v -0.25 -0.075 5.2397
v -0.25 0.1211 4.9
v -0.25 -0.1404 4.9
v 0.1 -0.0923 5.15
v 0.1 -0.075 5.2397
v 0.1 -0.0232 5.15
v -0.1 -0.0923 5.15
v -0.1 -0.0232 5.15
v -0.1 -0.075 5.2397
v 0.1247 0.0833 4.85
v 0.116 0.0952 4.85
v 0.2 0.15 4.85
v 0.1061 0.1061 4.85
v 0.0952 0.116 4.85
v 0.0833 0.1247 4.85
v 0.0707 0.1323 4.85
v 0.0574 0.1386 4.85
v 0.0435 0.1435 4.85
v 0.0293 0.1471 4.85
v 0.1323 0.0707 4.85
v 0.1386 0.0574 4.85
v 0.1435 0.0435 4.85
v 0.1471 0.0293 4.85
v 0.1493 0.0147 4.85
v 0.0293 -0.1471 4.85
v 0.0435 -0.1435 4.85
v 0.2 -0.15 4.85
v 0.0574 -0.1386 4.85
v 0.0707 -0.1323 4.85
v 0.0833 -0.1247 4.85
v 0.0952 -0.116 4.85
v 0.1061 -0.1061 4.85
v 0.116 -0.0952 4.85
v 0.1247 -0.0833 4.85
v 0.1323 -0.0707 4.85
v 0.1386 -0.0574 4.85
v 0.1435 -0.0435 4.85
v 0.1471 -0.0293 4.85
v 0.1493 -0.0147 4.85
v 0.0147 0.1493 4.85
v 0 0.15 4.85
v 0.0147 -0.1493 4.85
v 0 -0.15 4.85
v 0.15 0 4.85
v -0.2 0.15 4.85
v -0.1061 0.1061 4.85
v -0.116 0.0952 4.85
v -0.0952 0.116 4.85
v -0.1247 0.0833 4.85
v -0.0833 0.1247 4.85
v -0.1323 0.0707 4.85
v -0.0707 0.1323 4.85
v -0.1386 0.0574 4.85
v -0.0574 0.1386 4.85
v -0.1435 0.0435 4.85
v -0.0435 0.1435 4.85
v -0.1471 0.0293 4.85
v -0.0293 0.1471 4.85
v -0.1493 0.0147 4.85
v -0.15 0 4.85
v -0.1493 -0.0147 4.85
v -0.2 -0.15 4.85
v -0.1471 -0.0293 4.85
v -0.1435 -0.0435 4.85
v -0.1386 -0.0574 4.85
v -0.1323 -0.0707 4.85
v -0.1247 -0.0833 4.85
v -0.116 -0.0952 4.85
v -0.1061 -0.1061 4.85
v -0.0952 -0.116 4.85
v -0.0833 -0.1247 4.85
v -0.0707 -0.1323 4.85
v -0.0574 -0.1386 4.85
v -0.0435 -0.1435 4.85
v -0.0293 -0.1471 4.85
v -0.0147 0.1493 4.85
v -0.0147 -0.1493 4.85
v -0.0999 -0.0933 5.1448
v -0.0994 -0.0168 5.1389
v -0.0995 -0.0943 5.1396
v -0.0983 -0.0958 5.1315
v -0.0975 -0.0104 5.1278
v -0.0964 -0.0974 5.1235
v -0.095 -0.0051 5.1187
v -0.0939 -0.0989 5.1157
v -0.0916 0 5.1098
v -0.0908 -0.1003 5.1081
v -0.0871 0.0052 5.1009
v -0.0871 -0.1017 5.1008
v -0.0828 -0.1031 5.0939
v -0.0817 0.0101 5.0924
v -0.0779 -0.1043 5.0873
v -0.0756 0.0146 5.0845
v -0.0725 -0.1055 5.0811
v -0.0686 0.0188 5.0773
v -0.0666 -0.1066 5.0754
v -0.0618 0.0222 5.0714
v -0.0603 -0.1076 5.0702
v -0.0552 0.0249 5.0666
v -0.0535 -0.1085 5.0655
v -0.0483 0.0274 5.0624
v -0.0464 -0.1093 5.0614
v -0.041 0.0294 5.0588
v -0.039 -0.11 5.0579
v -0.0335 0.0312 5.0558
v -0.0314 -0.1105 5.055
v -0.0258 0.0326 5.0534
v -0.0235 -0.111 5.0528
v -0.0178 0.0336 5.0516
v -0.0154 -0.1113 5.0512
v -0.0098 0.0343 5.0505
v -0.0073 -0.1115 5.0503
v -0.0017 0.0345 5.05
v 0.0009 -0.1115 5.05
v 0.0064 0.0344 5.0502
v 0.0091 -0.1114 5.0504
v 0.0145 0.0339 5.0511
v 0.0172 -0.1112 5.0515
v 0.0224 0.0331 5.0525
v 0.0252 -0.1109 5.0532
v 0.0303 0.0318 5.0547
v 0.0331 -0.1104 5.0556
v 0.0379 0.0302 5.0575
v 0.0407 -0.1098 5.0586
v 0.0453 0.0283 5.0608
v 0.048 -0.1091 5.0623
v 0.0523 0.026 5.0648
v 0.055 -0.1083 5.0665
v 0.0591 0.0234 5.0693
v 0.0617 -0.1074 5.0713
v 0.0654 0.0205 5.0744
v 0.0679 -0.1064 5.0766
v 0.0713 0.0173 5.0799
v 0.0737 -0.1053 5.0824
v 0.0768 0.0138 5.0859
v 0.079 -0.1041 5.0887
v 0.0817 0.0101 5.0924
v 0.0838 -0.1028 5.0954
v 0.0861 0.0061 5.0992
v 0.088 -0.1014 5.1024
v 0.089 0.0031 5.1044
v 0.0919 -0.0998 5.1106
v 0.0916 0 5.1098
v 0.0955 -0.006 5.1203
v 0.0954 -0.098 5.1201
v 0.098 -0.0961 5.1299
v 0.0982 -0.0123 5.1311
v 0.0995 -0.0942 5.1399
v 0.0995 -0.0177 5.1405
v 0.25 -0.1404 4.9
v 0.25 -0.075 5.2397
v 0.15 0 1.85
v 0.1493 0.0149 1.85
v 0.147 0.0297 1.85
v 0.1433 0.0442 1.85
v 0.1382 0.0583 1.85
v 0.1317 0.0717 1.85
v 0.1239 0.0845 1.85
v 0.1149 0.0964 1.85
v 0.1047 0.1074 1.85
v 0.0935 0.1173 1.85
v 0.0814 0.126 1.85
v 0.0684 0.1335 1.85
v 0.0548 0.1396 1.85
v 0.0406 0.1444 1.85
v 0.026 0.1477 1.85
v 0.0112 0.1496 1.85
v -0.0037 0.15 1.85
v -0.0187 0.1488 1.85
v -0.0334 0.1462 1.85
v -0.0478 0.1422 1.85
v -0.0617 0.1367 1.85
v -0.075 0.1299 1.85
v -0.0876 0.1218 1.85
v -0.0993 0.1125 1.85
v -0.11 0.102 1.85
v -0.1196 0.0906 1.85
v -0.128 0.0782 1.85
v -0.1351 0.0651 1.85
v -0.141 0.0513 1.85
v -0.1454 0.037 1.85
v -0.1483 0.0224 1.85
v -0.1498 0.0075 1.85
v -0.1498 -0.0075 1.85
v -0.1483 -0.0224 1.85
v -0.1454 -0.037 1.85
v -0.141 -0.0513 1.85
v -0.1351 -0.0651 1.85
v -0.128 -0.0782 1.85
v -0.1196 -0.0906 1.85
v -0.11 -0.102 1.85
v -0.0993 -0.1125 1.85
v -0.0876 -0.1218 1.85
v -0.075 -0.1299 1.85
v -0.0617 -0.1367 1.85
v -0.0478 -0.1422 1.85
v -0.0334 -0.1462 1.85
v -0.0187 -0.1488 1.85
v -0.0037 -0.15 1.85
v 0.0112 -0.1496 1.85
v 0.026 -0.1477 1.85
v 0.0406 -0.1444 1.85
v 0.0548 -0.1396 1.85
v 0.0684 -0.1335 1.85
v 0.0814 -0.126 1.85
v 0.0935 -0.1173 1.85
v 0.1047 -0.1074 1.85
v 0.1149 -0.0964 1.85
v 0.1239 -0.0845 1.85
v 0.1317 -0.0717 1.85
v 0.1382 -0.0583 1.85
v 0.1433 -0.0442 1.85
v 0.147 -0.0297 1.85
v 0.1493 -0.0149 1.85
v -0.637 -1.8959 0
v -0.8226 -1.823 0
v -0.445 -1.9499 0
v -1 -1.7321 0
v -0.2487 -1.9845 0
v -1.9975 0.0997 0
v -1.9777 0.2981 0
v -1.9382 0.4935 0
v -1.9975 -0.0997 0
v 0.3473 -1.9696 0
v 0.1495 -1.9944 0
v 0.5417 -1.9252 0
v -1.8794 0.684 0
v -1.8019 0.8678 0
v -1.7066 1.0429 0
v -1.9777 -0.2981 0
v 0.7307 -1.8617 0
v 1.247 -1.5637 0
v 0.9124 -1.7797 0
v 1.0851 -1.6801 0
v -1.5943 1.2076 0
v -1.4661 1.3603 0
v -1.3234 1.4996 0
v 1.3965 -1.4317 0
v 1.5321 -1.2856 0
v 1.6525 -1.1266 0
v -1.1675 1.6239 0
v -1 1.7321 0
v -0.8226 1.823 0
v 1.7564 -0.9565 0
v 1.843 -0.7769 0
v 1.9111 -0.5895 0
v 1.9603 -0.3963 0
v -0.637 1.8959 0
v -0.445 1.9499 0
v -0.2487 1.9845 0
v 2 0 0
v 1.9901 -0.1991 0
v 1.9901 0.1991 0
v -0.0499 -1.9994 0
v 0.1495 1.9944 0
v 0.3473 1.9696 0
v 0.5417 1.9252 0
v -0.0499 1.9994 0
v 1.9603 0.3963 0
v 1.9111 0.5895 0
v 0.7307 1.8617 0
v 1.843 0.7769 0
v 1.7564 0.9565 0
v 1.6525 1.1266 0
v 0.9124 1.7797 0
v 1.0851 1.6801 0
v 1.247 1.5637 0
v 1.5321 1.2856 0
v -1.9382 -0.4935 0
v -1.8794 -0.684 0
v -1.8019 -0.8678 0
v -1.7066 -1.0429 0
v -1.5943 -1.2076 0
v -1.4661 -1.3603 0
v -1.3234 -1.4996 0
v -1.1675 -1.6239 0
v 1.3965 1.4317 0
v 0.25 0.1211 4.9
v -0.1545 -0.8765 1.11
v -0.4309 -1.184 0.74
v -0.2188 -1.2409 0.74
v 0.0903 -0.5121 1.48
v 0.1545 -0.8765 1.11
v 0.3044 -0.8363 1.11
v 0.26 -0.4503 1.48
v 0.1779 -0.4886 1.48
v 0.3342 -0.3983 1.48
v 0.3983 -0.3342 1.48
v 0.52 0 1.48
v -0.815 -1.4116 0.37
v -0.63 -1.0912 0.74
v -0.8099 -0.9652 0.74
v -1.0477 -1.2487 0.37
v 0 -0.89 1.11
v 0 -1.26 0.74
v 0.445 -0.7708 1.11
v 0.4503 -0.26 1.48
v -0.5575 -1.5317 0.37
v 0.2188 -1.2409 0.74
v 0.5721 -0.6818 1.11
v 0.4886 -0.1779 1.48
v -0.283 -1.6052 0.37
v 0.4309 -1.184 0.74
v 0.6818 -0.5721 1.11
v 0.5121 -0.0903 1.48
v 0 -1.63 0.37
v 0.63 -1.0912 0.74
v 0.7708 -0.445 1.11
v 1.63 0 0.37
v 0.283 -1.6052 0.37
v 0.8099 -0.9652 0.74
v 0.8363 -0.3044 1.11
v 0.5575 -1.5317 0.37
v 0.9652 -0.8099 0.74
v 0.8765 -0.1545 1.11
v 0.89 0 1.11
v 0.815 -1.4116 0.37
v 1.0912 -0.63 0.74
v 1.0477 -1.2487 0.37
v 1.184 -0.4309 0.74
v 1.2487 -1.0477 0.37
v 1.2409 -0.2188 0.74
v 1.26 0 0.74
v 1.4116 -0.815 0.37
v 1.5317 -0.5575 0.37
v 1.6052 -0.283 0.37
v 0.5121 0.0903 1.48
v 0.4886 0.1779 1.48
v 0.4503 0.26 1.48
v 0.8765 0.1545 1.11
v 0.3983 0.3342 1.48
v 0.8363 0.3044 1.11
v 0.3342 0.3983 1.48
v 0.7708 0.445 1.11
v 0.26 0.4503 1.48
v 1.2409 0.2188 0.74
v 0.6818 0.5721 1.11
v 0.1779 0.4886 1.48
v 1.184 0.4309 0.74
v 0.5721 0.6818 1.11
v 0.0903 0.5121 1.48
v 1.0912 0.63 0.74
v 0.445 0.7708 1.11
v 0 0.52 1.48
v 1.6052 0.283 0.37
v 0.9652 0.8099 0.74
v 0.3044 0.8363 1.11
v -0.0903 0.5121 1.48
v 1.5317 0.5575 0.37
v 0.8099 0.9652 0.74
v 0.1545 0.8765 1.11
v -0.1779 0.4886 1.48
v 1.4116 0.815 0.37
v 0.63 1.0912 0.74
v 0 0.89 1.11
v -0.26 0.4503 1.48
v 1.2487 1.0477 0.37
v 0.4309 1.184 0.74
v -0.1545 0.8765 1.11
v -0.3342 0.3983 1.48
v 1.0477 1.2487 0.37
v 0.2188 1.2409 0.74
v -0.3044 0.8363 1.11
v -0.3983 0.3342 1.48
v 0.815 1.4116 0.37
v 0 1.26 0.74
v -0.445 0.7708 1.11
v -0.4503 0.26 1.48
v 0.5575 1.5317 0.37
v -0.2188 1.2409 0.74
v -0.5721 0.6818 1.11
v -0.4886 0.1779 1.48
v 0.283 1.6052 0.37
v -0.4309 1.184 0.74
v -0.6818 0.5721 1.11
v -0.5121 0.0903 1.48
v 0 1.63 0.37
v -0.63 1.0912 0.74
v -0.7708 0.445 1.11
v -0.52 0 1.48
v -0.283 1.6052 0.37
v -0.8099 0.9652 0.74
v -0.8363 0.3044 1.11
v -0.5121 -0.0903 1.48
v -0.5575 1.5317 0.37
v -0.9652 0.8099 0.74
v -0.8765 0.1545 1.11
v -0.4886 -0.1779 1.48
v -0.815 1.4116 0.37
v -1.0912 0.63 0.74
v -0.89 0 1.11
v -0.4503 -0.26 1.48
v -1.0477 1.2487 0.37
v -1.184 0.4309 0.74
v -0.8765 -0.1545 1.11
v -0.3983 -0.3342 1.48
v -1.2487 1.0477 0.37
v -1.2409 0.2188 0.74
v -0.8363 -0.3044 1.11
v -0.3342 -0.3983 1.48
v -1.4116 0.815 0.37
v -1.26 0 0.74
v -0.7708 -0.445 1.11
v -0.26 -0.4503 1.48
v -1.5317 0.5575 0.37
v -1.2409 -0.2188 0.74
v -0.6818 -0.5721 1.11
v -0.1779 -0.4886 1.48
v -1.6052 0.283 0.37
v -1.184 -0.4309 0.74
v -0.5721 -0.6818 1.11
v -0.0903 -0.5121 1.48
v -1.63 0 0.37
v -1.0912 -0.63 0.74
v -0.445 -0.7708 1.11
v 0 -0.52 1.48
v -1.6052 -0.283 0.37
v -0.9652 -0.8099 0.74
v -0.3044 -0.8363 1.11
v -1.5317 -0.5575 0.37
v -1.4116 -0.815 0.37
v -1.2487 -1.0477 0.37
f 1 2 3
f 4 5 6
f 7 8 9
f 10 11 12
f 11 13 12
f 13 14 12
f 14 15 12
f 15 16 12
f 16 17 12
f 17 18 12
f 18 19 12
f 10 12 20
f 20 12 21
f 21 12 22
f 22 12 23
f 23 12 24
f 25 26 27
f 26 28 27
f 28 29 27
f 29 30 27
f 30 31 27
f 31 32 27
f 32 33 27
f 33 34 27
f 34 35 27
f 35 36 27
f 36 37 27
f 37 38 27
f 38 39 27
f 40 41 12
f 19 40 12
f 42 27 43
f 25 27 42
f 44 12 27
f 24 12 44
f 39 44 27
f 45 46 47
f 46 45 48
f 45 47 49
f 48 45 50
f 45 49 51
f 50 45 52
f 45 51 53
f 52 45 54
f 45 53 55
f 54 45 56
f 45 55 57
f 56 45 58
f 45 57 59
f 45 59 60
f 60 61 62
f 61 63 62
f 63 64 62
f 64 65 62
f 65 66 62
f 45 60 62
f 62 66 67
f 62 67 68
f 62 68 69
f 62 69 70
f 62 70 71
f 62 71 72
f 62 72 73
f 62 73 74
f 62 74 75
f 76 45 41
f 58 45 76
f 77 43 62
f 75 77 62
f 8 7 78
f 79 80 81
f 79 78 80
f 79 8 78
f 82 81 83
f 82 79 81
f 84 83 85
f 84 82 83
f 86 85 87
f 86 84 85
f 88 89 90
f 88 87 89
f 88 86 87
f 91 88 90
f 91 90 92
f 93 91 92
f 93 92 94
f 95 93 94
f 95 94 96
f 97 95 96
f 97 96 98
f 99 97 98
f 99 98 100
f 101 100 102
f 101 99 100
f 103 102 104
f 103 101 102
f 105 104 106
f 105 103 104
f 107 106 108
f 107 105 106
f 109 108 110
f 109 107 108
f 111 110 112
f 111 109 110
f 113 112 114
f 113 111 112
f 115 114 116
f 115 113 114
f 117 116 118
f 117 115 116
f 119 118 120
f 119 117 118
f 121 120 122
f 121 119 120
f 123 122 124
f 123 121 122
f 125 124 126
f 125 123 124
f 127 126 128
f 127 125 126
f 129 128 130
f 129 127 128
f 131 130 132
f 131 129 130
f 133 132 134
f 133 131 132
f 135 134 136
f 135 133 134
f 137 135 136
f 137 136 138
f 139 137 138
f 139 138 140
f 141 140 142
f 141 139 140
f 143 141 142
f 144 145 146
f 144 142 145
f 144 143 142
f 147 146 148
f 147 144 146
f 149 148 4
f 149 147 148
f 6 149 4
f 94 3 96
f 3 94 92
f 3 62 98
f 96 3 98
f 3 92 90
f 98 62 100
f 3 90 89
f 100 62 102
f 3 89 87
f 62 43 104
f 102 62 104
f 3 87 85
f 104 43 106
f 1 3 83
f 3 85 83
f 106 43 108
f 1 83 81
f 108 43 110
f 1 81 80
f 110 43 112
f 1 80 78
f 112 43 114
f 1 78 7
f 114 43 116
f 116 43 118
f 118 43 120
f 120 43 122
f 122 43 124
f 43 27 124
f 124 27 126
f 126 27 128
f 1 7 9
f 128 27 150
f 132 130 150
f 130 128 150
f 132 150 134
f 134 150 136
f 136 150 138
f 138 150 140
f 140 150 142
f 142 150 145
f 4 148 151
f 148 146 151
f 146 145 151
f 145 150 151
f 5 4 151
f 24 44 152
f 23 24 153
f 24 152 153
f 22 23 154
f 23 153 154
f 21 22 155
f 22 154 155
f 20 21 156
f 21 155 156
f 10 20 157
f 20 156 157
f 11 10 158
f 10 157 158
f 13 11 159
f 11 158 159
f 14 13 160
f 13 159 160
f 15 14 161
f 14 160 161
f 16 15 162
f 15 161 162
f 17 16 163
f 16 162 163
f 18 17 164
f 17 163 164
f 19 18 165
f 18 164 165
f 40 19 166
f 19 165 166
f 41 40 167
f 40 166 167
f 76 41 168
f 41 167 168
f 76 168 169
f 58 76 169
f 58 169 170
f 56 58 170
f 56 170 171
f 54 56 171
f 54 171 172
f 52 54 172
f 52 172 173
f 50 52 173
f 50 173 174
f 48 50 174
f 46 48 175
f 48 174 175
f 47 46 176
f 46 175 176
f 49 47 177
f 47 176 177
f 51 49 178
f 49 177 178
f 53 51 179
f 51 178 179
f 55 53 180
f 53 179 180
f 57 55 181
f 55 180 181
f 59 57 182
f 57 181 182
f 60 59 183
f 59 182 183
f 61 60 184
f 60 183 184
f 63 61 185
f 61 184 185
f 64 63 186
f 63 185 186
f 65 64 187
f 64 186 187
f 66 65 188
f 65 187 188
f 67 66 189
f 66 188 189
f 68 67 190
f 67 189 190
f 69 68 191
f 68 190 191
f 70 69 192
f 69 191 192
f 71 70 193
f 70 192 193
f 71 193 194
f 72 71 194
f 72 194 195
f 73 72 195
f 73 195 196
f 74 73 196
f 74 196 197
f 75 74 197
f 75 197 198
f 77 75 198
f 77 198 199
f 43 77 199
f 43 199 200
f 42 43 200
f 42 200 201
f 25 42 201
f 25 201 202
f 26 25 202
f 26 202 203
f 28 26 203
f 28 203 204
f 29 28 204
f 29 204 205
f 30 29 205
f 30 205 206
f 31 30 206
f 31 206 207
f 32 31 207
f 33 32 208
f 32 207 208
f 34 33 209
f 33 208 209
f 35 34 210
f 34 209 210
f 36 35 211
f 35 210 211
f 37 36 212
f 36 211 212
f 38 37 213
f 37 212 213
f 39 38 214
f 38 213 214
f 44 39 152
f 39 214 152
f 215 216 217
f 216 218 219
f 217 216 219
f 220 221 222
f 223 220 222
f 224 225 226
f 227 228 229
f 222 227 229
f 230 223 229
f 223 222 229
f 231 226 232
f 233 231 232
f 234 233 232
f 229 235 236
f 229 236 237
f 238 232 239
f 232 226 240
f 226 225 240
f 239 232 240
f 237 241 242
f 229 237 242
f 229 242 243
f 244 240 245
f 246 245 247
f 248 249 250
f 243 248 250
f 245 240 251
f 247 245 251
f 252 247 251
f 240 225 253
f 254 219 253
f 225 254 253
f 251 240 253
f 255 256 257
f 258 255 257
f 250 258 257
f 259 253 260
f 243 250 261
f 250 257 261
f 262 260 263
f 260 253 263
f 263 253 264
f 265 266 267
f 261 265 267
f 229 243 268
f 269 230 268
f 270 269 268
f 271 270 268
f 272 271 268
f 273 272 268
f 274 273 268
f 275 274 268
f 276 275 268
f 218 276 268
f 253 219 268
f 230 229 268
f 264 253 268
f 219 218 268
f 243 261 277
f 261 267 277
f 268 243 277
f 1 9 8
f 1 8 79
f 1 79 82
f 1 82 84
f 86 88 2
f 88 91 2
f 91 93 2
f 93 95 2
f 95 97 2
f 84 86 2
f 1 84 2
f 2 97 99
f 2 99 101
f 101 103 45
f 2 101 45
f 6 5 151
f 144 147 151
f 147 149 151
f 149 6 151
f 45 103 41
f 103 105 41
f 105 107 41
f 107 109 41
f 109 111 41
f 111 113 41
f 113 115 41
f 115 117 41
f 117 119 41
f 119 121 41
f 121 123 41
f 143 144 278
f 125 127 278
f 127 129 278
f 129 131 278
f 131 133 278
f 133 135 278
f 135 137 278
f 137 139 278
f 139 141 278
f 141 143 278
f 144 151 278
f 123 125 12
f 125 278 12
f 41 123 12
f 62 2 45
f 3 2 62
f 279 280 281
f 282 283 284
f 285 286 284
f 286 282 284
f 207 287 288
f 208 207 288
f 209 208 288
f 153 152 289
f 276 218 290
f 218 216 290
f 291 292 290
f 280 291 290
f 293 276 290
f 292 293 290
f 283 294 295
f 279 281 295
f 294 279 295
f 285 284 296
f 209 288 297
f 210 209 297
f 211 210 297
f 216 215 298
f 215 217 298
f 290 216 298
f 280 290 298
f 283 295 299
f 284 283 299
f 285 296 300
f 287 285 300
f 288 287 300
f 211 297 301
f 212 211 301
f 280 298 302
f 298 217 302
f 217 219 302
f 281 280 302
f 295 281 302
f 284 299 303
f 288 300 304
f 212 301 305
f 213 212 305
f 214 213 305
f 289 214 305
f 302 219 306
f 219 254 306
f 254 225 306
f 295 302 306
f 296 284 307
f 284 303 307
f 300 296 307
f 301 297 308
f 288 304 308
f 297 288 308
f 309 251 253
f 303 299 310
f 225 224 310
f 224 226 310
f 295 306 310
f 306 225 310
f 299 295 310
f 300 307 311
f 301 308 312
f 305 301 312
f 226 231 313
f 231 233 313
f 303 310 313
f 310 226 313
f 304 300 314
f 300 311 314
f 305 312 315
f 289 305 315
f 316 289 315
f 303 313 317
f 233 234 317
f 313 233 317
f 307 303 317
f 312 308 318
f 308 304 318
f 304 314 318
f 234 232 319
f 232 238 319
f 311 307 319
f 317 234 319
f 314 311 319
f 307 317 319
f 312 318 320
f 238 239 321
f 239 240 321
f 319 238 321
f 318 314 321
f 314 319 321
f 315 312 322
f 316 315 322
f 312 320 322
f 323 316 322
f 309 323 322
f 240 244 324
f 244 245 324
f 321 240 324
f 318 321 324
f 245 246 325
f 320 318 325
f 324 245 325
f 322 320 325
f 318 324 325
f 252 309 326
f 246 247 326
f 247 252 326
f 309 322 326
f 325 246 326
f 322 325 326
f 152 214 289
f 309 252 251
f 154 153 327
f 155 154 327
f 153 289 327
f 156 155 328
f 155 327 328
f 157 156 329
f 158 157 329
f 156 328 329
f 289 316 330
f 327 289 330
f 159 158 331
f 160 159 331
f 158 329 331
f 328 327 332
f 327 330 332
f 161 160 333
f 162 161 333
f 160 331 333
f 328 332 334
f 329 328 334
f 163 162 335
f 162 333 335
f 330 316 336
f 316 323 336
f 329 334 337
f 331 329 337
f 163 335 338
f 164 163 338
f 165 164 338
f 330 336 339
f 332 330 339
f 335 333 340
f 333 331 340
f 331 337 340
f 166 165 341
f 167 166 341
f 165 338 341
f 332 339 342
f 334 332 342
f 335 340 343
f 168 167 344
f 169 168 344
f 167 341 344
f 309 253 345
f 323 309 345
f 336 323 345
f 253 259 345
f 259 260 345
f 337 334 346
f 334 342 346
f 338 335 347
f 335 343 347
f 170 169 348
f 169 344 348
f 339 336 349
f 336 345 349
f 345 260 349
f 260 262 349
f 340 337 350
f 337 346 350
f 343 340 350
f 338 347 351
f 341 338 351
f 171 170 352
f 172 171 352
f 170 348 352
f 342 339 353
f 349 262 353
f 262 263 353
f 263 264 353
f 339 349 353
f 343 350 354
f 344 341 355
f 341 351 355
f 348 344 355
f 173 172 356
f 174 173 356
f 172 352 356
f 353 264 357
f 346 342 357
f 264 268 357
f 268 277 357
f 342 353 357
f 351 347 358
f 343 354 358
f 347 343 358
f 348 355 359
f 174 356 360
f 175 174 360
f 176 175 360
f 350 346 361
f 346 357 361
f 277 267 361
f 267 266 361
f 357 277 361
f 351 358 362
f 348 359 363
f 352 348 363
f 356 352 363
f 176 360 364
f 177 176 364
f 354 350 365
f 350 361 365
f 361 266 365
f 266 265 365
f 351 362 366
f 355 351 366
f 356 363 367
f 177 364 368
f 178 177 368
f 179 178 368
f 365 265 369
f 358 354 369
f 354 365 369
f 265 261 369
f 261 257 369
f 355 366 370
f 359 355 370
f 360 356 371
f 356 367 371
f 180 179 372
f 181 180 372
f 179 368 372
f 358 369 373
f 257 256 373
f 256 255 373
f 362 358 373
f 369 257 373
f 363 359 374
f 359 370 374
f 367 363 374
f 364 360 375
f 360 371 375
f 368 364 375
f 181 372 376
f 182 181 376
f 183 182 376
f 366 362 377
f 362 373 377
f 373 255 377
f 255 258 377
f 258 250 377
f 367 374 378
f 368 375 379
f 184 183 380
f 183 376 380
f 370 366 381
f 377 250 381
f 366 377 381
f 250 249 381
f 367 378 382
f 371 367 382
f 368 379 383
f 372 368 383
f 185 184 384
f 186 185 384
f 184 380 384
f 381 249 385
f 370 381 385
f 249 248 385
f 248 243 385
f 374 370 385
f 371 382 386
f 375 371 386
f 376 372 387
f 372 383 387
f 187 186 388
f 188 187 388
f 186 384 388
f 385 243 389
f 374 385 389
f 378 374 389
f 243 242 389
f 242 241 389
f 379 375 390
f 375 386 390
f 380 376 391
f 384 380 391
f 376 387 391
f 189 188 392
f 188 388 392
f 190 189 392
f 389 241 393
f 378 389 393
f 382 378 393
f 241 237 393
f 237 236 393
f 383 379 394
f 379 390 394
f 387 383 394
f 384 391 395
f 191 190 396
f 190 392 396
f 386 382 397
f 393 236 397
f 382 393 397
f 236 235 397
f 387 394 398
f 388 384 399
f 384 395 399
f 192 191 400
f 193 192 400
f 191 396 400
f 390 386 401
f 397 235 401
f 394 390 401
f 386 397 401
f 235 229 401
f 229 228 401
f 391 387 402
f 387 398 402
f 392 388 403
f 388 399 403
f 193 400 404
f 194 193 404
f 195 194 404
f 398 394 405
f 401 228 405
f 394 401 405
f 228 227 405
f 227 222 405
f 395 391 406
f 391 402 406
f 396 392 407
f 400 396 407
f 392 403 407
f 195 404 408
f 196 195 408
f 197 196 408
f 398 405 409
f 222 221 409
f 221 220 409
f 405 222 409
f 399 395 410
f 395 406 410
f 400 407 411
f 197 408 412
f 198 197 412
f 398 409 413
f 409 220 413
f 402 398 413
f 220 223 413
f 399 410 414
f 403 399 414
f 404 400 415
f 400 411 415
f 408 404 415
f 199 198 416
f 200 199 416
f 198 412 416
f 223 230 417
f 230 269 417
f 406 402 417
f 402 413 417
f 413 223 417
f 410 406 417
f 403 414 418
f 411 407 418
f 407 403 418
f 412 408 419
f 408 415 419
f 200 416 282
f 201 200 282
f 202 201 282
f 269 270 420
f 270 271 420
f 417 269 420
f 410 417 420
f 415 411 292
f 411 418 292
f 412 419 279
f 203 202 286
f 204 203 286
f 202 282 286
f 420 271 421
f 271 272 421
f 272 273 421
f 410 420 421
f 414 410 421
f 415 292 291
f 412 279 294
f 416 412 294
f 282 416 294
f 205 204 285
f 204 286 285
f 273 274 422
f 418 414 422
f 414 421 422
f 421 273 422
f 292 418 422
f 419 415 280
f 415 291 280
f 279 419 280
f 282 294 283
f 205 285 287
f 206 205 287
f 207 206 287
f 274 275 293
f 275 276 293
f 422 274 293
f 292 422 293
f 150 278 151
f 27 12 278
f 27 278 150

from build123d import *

# Parameters (mm, degrees)
PAD_DEPTH         = 0.25
POCKET_DEPTH      = 2.001
POCKET_DEPTH_BACK = 2.001
CHAMFER_SIZE      = 0.05
CHAMFER001_SIZE   = 0.05


with BuildPart() as part:
    # Sketch → Revolution (revolve)
    with BuildSketch(Plane.XZ):
        Polygon((0, 4.85), (0.15, 4.85), (0.15, 1.85), (2, 0), (0, 0), align=None)
    revolve(axis=Axis((0, 0, 0), (0, 0, 1)))

    # Sketch010 → Pad (new body, symmetric)
    with BuildSketch(Plane.YZ):
        Polygon((0.15, 4.85), (-0.15, 4.85), (-0.075, 5.239711), align=None)
    extrude(amount=PAD_DEPTH, both=True)

    # Sketch011 → Pocket (cut, two sides)
    with BuildSketch(Plane.XZ) as pocket_sk:
        with BuildLine():
            ThreePointArc((-0.1, 5.15), (0, 5.05), (0.1, 5.15))
            Line((0.1, 5.605646), (0.1, 5.15))
            Line((-0.1, 5.605646), (0.1, 5.605646))
            Line((-0.1, 5.15), (-0.1, 5.605646))
        make_face()
    extrude(amount=-POCKET_DEPTH, mode=Mode.SUBTRACT)
    extrude(pocket_sk.sketch, amount=POCKET_DEPTH_BACK, mode=Mode.SUBTRACT)

    # Chamfer
    chamfer_edges = [part.edges().sort_by_distance(p)[0] for p in [
        (0.25, 0, 4.85),
    ]]
    chamfer(chamfer_edges, length=CHAMFER_SIZE)

    # Chamfer001
    chamfer001_edges = [part.edges().sort_by_distance(p)[0] for p in [
        (-0.25, 0, 4.85),
    ]]
    chamfer(chamfer001_edges, length=CHAMFER001_SIZE)


solid = part.part
